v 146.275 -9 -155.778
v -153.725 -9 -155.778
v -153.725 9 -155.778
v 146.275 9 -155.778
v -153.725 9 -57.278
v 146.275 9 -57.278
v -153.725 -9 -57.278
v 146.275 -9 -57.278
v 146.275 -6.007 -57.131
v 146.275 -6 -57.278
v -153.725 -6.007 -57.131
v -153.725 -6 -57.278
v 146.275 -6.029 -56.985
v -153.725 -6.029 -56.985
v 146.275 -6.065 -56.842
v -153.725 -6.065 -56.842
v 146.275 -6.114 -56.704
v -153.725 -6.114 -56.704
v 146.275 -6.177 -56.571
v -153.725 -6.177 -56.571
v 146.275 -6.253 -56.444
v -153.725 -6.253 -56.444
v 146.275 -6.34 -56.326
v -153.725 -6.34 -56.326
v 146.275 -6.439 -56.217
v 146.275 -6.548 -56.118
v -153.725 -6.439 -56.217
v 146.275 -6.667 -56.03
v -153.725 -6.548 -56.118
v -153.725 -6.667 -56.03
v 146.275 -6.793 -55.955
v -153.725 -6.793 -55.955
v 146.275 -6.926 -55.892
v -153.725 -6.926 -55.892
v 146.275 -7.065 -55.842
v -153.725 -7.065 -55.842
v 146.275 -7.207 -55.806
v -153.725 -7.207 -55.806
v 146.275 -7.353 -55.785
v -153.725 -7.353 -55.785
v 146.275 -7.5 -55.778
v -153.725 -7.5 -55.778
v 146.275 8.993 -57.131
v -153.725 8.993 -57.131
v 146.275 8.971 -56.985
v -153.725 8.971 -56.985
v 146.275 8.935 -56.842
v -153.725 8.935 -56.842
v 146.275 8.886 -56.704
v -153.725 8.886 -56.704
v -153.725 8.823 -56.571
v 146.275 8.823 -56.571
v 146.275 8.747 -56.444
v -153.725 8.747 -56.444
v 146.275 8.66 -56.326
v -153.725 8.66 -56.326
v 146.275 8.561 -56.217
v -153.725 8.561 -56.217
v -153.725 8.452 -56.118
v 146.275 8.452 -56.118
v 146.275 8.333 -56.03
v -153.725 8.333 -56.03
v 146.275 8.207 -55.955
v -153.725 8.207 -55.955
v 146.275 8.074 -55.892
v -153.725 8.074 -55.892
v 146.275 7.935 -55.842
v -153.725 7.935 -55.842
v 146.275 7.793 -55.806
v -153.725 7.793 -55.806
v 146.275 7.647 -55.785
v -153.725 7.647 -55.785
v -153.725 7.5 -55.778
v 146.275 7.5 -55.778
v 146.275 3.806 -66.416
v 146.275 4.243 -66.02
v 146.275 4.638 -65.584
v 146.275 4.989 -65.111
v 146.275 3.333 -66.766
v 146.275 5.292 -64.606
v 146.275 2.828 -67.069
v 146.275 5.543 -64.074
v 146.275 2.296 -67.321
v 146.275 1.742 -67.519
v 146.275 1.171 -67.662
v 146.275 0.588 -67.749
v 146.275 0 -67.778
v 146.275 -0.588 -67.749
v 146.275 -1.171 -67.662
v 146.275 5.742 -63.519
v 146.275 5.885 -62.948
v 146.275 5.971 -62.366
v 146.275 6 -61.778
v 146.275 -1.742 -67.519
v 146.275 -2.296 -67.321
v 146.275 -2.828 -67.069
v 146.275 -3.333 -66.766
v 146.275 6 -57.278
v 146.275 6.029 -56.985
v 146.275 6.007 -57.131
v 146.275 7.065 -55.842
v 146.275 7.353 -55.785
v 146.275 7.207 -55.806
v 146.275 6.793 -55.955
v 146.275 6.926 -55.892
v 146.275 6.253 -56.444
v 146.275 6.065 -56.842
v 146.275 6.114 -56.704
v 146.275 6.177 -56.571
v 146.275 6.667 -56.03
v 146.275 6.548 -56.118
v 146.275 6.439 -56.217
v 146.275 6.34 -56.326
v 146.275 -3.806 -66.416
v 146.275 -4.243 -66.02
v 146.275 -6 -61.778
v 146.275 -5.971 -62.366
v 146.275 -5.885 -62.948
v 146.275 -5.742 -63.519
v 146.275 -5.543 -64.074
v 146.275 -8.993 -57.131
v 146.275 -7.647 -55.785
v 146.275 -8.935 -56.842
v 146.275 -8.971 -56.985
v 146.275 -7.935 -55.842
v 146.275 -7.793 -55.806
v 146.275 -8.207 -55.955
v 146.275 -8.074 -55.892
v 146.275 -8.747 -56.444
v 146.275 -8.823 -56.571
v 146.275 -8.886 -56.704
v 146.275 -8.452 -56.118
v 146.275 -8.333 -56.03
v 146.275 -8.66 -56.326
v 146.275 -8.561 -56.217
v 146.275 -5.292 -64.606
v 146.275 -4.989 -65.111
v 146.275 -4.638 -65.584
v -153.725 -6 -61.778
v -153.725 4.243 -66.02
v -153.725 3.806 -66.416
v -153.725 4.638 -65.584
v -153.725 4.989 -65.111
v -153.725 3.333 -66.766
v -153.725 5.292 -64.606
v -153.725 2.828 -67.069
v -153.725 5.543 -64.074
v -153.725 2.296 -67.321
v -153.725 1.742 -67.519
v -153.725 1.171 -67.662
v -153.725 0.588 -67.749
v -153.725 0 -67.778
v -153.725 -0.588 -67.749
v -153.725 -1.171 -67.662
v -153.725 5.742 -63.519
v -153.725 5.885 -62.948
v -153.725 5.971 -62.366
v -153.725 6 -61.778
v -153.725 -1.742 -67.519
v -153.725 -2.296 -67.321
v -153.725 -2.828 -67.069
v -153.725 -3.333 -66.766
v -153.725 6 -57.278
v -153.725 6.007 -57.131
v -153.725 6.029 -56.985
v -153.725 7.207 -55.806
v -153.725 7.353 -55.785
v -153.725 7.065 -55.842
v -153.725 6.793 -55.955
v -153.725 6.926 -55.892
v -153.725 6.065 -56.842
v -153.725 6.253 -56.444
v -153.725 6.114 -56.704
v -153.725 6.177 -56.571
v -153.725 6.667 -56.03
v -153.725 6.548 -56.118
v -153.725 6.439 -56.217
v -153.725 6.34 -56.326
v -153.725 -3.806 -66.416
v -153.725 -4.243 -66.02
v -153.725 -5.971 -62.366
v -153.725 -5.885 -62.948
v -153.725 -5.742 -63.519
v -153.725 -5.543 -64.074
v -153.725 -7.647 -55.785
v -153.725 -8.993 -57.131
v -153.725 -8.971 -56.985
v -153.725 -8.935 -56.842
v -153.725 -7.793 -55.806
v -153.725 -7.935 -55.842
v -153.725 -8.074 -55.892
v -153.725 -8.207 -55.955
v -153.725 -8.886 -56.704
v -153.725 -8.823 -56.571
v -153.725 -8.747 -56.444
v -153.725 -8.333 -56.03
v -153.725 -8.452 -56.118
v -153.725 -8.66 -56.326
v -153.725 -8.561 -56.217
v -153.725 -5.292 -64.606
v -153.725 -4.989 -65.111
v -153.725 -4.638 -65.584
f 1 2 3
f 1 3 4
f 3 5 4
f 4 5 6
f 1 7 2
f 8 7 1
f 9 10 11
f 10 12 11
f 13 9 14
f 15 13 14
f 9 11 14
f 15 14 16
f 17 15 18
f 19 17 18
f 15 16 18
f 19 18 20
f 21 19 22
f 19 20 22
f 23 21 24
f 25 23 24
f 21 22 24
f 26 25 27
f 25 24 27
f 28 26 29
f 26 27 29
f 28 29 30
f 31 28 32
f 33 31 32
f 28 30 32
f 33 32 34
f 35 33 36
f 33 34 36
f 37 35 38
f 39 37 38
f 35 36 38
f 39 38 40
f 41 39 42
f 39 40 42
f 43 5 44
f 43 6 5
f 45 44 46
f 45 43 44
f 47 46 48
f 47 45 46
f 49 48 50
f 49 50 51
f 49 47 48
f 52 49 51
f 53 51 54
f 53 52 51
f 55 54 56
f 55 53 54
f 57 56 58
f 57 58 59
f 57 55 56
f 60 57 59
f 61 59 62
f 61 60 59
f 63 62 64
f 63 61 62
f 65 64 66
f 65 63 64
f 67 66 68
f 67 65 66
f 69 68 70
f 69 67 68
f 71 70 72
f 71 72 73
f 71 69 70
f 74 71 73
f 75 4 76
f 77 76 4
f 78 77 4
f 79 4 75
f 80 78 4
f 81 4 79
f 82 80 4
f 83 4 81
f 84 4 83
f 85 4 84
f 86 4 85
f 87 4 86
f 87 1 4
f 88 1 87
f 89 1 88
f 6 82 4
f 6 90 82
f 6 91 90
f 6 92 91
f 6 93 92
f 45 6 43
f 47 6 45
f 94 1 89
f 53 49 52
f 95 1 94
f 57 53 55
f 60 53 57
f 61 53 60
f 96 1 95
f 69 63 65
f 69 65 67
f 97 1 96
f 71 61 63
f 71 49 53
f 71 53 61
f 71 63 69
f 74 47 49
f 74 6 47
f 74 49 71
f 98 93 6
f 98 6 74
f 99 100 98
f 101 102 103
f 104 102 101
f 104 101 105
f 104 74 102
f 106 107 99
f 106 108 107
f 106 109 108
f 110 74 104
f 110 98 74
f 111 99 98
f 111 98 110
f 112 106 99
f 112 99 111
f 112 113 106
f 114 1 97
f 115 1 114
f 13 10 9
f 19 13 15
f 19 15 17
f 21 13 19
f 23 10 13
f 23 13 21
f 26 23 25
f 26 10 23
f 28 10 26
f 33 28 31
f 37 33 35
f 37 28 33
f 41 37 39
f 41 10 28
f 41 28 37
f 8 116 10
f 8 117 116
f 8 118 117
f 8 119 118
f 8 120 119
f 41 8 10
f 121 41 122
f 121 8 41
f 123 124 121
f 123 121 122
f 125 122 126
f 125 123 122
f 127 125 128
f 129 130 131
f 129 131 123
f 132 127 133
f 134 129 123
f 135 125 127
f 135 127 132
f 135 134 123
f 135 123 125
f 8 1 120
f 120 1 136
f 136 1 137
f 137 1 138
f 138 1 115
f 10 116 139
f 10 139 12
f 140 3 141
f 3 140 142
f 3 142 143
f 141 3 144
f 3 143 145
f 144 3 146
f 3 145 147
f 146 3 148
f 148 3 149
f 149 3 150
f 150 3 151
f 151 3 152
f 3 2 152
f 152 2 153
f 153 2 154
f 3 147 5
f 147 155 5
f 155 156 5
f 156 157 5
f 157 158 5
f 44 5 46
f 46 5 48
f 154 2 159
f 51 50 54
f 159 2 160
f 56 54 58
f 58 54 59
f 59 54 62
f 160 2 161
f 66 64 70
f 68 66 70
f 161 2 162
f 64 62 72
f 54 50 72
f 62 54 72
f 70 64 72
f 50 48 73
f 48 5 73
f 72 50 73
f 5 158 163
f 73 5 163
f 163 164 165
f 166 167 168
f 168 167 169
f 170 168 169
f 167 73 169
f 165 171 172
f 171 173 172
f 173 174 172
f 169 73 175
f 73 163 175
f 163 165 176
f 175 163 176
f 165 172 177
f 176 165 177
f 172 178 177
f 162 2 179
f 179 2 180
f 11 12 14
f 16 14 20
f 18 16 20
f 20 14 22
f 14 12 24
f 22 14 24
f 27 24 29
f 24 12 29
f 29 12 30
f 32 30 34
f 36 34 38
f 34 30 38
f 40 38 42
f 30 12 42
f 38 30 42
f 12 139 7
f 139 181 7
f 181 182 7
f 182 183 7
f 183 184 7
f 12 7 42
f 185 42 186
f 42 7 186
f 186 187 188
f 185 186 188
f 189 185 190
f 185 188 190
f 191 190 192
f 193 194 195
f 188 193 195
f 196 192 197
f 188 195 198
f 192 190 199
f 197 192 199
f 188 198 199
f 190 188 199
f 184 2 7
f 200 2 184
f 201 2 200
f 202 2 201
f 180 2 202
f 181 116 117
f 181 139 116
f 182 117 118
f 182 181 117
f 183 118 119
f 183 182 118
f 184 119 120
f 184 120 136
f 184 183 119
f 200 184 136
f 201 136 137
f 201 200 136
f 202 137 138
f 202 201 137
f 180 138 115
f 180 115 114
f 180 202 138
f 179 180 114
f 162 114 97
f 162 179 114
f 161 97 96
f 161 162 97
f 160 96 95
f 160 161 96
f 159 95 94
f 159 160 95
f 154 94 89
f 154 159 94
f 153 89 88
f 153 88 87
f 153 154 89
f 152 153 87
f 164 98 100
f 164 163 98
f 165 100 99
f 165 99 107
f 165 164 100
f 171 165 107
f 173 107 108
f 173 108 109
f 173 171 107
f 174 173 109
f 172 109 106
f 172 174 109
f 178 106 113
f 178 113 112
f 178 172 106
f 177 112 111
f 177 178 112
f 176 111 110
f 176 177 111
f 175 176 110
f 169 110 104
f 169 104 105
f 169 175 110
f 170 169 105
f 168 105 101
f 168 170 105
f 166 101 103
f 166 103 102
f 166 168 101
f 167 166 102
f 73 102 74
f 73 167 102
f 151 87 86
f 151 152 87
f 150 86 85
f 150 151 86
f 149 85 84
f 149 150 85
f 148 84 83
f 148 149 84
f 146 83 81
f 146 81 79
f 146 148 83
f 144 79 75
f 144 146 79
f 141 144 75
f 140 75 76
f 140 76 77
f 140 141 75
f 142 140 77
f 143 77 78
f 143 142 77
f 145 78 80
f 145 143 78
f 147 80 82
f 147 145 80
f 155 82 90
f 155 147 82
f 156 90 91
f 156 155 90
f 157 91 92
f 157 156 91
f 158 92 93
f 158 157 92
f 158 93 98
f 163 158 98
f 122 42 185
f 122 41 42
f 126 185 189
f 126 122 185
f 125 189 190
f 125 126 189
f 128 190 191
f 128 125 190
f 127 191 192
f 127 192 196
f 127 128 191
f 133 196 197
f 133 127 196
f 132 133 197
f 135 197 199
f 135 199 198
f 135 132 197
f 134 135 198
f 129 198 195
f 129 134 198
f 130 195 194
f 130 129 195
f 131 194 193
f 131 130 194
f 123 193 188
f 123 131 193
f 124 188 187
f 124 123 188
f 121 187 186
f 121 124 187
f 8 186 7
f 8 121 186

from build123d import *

# Parameters (mm, degrees)
F0_W     = 300
F0_H     = 100
F1_DEPTH = 9
F2_W     = 12
F2_H     = 12
F3_DEPTH = 300.001
F4_R     = 5.99999
F5_R     = 1.49999


# Not quite as in the source:
# - a fillet or chamfer is up to 0.001 mm smaller than in the source, because OpenCascade refuses the exact size


with BuildPart() as f1:
    # F0 (on Front) → F1 (new body, symmetric)
    with BuildSketch(Plane.XZ):
        with Locations((-3.7248600274, -105.7776198197)):
            Rectangle(F0_W, F0_H)
    extrude(amount=F1_DEPTH, both=True)

    # F2 (on face) → F3 (cut, through all)
    with BuildSketch(Plane.YZ.offset(146.2751399726)):
        with Locations((0, -61.7776198197)):
            Rectangle(F2_W, F2_H)
    extrude(amount=-F3_DEPTH, mode=Mode.SUBTRACT)

    # F4 (radius 6 in the source; OpenCascade refuses exactly that, so slightly less here)
    f4_edges = [f1.edges().sort_by_distance(p)[0] for p in [
        (-3.72486, 6, -67.77762),
        (-3.72486, -6, -67.77762),
    ]]
    fillet(f4_edges, radius=F4_R)

    # F5 (radius 1.5 in the source; OpenCascade refuses exactly that, so slightly less here)
    f5_edges = [f1.edges().sort_by_distance(p)[0] for p in [
        (-3.72486, -9, -55.77762),
        (-3.72486, -6, -55.77762),
        (-3.72486, 6, -55.77762),
        (-3.72486, 9, -55.77762),
    ]]
    fillet(f5_edges, radius=F5_R)


solid = f1.part
